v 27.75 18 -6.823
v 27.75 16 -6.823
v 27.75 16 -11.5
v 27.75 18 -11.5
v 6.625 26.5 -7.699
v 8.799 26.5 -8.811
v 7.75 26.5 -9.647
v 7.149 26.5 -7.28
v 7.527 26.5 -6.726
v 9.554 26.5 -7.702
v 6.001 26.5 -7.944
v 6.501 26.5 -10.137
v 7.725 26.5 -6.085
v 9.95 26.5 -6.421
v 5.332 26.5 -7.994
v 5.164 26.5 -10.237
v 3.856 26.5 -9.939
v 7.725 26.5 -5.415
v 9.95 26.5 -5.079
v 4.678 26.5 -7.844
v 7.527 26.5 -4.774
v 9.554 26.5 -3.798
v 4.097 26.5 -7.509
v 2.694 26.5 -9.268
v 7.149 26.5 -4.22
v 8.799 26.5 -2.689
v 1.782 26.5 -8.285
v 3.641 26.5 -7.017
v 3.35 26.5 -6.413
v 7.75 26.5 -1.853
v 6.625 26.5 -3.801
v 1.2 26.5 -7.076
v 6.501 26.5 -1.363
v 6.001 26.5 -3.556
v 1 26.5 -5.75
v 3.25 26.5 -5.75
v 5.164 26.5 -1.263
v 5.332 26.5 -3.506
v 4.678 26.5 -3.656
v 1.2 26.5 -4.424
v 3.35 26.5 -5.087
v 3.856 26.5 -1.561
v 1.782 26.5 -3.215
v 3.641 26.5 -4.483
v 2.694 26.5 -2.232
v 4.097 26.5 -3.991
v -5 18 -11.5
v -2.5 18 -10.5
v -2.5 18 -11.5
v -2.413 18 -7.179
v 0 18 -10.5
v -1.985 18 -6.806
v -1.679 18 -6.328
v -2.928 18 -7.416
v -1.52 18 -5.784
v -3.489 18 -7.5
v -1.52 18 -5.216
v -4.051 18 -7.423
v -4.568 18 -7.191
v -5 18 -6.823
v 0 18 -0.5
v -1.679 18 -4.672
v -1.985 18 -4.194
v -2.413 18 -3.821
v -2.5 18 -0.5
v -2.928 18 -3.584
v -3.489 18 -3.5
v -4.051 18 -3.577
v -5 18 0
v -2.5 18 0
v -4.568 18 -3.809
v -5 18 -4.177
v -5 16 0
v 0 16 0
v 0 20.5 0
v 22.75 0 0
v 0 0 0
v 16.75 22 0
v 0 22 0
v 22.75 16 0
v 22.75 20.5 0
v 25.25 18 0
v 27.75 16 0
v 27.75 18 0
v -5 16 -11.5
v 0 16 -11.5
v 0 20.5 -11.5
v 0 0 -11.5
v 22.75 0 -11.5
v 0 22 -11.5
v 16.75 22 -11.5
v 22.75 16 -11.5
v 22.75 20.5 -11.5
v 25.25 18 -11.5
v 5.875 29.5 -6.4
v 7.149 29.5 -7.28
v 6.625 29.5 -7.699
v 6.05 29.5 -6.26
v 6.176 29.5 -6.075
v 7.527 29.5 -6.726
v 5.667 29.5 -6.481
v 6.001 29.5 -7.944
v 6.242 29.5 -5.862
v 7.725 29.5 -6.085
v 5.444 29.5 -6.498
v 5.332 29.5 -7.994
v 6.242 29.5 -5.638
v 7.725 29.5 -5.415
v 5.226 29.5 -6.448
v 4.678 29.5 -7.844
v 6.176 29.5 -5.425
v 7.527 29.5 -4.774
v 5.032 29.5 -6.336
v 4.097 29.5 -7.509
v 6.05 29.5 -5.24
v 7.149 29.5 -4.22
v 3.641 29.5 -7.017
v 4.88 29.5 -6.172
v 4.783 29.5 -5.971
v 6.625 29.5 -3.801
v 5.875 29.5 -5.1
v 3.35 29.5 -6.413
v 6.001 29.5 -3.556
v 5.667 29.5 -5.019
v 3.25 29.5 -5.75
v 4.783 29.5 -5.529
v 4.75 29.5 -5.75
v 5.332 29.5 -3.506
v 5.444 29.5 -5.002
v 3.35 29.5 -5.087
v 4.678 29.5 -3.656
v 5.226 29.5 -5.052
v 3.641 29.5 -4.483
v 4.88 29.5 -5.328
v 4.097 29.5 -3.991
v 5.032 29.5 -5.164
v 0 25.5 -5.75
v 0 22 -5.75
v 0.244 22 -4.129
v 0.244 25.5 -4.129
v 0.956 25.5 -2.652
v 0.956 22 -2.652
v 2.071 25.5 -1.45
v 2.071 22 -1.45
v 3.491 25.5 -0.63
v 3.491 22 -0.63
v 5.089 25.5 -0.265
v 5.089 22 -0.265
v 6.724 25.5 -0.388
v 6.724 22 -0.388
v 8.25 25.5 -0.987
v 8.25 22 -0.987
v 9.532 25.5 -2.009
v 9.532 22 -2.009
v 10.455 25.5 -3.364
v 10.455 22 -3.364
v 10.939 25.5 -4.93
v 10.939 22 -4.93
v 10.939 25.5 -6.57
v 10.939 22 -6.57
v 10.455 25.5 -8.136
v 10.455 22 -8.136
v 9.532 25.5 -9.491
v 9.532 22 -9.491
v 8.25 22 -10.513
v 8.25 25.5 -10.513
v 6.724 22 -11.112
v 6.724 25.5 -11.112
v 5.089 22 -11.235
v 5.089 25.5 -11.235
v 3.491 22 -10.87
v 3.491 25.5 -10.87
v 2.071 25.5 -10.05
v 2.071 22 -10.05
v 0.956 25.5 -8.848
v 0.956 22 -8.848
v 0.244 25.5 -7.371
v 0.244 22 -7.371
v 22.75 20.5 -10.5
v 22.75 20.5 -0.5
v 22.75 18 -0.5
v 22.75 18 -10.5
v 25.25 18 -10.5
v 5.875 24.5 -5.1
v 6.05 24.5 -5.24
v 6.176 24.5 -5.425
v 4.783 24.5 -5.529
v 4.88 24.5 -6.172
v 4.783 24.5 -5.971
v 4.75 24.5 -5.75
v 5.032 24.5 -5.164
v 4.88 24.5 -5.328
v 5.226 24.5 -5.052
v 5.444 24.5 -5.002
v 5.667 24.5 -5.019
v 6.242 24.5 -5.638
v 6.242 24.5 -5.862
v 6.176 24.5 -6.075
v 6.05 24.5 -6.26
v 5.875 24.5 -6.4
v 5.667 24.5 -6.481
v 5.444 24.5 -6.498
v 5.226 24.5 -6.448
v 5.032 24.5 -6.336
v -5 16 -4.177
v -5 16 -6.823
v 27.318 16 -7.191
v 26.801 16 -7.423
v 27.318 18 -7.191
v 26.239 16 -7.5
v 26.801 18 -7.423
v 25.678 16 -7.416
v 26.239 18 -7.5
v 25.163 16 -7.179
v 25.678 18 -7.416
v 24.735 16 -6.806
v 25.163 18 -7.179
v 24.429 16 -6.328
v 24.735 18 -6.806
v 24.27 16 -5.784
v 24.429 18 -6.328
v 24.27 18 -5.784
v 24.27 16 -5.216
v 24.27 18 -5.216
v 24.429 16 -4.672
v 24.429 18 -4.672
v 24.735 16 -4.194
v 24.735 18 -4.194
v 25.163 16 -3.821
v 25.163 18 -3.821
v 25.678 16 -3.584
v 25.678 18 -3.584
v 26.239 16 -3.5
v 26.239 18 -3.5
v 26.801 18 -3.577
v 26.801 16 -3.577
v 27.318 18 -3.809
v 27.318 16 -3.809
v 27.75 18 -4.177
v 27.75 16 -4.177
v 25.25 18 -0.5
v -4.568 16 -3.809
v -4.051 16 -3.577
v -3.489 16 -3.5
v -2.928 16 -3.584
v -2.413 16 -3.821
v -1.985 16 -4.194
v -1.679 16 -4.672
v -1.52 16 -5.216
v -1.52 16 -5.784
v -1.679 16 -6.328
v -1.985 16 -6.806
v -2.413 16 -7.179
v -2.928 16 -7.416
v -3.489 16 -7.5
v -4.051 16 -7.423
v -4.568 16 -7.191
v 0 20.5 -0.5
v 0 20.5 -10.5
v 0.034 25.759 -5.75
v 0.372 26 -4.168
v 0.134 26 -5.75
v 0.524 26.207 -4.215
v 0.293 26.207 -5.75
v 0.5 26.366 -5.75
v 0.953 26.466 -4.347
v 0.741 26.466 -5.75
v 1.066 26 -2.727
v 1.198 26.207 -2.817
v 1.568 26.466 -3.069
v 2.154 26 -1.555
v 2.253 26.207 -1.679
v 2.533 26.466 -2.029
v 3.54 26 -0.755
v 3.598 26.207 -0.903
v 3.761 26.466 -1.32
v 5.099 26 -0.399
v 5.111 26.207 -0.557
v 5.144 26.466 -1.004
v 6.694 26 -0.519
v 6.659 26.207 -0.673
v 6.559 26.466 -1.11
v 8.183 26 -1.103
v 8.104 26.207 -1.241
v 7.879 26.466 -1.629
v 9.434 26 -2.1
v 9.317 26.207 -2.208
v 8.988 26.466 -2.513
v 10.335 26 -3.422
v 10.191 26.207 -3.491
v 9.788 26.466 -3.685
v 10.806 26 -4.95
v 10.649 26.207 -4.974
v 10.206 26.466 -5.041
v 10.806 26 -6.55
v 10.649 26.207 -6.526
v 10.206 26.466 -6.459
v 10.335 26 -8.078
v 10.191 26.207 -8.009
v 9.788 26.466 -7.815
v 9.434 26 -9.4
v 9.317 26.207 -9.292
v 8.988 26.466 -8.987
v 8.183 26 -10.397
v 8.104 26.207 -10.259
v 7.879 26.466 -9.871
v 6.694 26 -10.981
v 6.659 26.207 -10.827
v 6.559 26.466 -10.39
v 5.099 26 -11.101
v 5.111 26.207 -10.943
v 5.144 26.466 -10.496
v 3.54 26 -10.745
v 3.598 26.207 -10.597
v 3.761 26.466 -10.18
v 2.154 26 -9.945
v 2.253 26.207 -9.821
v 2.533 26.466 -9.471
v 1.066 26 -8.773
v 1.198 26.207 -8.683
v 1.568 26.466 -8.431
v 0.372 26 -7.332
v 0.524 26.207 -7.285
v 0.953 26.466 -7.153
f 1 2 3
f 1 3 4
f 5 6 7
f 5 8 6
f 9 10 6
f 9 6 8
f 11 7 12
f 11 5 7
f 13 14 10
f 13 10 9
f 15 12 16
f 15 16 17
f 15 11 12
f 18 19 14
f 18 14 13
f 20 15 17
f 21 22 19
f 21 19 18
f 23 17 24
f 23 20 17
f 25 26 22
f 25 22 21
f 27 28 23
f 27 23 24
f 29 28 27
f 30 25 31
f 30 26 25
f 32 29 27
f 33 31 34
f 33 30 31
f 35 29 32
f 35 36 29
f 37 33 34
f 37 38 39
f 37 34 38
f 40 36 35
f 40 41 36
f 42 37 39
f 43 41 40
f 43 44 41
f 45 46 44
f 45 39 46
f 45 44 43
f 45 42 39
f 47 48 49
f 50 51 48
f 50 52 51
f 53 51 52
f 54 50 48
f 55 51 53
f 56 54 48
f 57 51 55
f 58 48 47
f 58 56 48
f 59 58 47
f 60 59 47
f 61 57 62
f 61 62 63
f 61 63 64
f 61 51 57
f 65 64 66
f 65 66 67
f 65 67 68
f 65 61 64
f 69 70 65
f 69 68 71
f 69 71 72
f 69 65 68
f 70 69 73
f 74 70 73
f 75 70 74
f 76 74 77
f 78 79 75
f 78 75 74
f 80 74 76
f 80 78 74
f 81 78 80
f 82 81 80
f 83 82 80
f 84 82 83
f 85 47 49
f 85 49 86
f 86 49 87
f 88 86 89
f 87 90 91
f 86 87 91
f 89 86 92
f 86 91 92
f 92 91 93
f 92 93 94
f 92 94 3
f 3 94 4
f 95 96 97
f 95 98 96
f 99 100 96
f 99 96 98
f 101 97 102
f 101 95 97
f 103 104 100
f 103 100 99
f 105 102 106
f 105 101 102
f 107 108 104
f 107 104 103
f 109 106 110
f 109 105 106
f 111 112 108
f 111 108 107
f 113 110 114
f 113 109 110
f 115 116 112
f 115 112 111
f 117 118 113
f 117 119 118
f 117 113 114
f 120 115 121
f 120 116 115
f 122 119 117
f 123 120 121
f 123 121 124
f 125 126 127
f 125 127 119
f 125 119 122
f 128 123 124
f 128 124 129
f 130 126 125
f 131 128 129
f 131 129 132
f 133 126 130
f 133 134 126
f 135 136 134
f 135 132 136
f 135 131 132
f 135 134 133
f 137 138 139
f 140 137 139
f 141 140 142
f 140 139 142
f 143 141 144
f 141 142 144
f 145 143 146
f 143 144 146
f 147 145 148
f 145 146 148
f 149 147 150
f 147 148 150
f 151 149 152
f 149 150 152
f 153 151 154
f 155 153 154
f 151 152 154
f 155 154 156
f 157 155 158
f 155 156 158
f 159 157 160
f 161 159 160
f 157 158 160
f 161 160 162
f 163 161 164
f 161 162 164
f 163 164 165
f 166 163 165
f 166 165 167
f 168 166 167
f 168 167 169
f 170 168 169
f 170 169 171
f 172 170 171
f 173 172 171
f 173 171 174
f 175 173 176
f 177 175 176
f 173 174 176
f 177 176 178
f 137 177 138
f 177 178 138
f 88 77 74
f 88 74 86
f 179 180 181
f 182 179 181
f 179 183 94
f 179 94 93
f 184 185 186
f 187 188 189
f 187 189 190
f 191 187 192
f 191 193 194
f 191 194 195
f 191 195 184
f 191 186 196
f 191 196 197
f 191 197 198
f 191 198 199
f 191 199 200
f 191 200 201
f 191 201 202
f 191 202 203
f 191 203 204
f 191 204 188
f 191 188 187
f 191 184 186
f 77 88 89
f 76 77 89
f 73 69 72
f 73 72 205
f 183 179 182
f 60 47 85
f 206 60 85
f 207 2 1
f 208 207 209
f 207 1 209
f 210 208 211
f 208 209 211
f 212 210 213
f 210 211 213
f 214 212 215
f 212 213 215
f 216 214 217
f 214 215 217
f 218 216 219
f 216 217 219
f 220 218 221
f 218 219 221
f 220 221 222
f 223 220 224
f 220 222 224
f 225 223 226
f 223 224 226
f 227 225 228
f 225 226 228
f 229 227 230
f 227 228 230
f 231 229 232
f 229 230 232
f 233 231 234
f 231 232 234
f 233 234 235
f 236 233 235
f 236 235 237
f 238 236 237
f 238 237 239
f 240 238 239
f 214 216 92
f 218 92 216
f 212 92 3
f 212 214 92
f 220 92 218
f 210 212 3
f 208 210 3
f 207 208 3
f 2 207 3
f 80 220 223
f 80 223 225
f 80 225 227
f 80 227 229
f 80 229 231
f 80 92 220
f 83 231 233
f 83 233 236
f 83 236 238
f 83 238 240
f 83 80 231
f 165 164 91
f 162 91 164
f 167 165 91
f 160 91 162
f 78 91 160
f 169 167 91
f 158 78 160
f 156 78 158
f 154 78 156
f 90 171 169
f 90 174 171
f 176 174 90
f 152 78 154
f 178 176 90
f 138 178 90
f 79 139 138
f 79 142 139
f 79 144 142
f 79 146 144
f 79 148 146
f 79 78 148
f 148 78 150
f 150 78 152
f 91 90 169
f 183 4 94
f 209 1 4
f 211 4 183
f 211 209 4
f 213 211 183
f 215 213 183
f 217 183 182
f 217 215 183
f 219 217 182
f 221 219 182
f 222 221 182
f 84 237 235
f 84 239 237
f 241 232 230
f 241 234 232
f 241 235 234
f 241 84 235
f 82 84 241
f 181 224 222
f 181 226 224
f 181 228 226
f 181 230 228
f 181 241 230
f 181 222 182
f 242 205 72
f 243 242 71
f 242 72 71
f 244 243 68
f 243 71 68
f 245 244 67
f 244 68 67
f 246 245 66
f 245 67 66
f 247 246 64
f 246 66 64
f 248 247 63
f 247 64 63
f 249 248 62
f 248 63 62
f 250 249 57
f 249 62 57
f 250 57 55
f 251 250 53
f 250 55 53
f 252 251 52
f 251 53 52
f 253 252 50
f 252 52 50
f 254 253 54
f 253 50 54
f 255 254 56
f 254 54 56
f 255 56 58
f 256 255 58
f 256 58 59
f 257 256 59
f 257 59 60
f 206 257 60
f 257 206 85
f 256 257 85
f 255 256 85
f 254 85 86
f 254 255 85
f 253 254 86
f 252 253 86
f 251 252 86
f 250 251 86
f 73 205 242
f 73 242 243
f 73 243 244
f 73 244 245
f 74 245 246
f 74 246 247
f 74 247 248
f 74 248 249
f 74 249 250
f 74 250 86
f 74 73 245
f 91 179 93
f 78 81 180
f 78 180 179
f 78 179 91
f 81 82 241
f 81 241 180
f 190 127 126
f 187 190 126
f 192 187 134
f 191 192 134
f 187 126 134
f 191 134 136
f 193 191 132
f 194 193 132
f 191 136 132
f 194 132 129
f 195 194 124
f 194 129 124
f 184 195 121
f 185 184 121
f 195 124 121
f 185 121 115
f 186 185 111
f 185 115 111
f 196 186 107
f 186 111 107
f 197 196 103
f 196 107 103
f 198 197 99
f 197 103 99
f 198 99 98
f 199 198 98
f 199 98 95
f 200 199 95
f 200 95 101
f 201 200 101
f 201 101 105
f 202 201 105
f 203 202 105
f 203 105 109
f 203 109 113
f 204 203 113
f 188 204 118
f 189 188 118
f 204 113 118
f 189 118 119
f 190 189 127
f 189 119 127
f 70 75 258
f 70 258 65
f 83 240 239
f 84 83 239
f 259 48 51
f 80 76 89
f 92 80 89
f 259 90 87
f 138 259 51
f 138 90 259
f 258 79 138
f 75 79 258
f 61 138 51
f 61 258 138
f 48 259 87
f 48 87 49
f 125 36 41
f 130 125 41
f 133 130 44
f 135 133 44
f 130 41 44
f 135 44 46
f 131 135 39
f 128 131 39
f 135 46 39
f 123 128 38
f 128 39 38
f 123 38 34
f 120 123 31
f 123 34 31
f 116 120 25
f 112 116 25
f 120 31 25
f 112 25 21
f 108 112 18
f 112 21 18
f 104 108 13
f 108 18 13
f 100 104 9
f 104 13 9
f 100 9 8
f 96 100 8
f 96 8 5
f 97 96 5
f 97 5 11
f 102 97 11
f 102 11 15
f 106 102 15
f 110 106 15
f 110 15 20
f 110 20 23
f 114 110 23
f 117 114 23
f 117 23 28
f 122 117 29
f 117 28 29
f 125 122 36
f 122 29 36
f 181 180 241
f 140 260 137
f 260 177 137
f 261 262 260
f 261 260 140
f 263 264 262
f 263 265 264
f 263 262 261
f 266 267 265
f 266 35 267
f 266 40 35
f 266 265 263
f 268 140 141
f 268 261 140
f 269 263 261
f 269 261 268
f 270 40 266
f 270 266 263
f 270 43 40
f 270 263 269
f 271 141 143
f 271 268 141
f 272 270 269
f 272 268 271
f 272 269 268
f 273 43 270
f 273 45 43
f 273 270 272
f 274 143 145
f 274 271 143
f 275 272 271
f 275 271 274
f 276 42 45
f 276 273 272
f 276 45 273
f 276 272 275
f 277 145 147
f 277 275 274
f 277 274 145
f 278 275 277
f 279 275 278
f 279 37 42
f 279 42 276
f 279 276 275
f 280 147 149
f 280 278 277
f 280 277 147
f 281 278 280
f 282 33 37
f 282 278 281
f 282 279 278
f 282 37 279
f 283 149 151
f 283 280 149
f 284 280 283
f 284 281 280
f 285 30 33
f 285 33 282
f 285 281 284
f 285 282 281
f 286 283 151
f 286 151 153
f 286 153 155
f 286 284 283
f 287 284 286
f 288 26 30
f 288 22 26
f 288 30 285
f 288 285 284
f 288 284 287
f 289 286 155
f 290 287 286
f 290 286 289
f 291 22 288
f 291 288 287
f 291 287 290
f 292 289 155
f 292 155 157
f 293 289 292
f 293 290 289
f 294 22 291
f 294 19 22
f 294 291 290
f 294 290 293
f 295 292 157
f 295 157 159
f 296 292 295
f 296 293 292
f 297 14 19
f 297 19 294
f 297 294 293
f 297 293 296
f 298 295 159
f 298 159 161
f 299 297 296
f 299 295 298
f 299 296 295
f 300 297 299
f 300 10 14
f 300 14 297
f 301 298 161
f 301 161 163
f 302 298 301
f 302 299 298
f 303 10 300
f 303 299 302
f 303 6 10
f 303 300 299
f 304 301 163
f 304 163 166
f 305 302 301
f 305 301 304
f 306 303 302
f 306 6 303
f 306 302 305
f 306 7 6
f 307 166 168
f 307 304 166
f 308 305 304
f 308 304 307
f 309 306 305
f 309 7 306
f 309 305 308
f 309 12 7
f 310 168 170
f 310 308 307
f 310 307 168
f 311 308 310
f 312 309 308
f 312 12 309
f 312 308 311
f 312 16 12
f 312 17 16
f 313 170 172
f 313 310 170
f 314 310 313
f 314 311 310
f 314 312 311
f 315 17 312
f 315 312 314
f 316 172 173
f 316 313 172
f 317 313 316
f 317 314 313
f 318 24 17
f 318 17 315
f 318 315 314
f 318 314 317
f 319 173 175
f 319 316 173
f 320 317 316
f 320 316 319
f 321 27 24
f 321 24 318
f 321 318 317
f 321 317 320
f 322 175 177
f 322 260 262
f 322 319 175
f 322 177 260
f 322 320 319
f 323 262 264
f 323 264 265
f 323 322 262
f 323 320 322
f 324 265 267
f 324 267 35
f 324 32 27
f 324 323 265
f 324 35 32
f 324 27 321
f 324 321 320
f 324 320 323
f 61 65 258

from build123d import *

# Parameters (mm, degrees)
SKETCH1_W           = 22.75
SKETCH1_H           = 11.5
BOSS_EXTRUDE1_DEPTH = 16
BOSS_EXTRUDE2_DEPTH = 11.5
SKETCH3_R           = 5.5
BOSS_EXTRUDE3_DEPTH = 4.5
FILLET1_R           = 1
SKETCH5_R           = 2.25
BOSS_EXTRUDE5_DEPTH = 3
SKETCH6_R           = 0.75
CUT_EXTRUDE1_DEPTH  = 5
CUT_EXTRUDE2_START  = -0.5
CUT_EXTRUDE2_DEPTH  = 10
SKETCH7_R           = 2
CUT_EXTRUDE3_DEPTH  = 36.01874498


with BuildPart() as part:
    # Sketch1 → Boss-Extrude1 (new body)
    with BuildSketch(Plane(origin=(0, 0, 0), x_dir=(1, 0, 0), z_dir=(0, 1, 0))):
        with Locations((11.375, 5.75)):
            Rectangle(SKETCH1_W, SKETCH1_H)
    extrude(amount=BOSS_EXTRUDE1_DEPTH)

    # Sketch2 → Boss-Extrude2 (add)
    with BuildSketch(Plane.XY):
        Polygon((22.75, 16), (27.75, 16), (27.75, 18), (25.25, 18), (22.75, 20.5), (16.75, 22), (0, 22), (0, 20.5), (-2.5, 18), (-5, 18), (-5, 16), (0, 16), align=None)
    extrude(amount=-BOSS_EXTRUDE2_DEPTH)

    # Sketch3 → Boss-Extrude3 (add)
    with BuildSketch(Plane(origin=(0, 22, 0), x_dir=(1, 0, 0), z_dir=(0, 1, 0))):
        with Locations(Location((5.5, 5.75, 0), (0, 0, 180))):
            Circle(SKETCH3_R)
    extrude(amount=BOSS_EXTRUDE3_DEPTH)

    # Fillet1
    fillet1_edges = [part.edges().sort_by_distance(p)[0] for p in [
        (11, 26.5, -5.75),
    ]]
    fillet(fillet1_edges, radius=FILLET1_R)

    # Sketch5 → Boss-Extrude5 (add)
    with BuildSketch(Plane(origin=(0, 26.5, 0), x_dir=(1, 0, 0), z_dir=(0, 1, 0))):
        with Locations(Location((5.5, 5.75, 0), (0, 0, 180))):
            Circle(SKETCH5_R)
    extrude(amount=BOSS_EXTRUDE5_DEPTH)

    # Sketch6 → Cut-Extrude1 (cut)
    with BuildSketch(Plane(origin=(0, 29.5, 0), x_dir=(1, 0, 0), z_dir=(0, 1, 0))):
        with Locations(Location((5.5, 5.75, 0), (0, 0, 180))):
            Circle(SKETCH6_R)
    extrude(amount=-CUT_EXTRUDE1_DEPTH, mode=Mode.SUBTRACT)

    # Sketch8 → Cut-Extrude2 (cut)
    with BuildSketch(Plane.XY.offset(CUT_EXTRUDE2_START)):
        Polygon((-2.5, 18), (0, 18), (0, 20.5), align=None)
        Polygon((22.75, 20.5), (22.75, 18), (25.25, 18), align=None)
    extrude(amount=-CUT_EXTRUDE2_DEPTH, mode=Mode.SUBTRACT)

    # Sketch7 → Cut-Extrude3 (cut, through all)
    with BuildSketch(Plane(origin=(0, 18, 0), x_dir=(1, 0, 0), z_dir=(0, 1, 0))):
        with Locations((26.25, 5.5)):
            Circle(SKETCH7_R)
        with Locations((-3.5, 5.5)):
            Circle(SKETCH7_R)
    extrude(amount=-CUT_EXTRUDE3_DEPTH, mode=Mode.SUBTRACT)


solid = part.part
